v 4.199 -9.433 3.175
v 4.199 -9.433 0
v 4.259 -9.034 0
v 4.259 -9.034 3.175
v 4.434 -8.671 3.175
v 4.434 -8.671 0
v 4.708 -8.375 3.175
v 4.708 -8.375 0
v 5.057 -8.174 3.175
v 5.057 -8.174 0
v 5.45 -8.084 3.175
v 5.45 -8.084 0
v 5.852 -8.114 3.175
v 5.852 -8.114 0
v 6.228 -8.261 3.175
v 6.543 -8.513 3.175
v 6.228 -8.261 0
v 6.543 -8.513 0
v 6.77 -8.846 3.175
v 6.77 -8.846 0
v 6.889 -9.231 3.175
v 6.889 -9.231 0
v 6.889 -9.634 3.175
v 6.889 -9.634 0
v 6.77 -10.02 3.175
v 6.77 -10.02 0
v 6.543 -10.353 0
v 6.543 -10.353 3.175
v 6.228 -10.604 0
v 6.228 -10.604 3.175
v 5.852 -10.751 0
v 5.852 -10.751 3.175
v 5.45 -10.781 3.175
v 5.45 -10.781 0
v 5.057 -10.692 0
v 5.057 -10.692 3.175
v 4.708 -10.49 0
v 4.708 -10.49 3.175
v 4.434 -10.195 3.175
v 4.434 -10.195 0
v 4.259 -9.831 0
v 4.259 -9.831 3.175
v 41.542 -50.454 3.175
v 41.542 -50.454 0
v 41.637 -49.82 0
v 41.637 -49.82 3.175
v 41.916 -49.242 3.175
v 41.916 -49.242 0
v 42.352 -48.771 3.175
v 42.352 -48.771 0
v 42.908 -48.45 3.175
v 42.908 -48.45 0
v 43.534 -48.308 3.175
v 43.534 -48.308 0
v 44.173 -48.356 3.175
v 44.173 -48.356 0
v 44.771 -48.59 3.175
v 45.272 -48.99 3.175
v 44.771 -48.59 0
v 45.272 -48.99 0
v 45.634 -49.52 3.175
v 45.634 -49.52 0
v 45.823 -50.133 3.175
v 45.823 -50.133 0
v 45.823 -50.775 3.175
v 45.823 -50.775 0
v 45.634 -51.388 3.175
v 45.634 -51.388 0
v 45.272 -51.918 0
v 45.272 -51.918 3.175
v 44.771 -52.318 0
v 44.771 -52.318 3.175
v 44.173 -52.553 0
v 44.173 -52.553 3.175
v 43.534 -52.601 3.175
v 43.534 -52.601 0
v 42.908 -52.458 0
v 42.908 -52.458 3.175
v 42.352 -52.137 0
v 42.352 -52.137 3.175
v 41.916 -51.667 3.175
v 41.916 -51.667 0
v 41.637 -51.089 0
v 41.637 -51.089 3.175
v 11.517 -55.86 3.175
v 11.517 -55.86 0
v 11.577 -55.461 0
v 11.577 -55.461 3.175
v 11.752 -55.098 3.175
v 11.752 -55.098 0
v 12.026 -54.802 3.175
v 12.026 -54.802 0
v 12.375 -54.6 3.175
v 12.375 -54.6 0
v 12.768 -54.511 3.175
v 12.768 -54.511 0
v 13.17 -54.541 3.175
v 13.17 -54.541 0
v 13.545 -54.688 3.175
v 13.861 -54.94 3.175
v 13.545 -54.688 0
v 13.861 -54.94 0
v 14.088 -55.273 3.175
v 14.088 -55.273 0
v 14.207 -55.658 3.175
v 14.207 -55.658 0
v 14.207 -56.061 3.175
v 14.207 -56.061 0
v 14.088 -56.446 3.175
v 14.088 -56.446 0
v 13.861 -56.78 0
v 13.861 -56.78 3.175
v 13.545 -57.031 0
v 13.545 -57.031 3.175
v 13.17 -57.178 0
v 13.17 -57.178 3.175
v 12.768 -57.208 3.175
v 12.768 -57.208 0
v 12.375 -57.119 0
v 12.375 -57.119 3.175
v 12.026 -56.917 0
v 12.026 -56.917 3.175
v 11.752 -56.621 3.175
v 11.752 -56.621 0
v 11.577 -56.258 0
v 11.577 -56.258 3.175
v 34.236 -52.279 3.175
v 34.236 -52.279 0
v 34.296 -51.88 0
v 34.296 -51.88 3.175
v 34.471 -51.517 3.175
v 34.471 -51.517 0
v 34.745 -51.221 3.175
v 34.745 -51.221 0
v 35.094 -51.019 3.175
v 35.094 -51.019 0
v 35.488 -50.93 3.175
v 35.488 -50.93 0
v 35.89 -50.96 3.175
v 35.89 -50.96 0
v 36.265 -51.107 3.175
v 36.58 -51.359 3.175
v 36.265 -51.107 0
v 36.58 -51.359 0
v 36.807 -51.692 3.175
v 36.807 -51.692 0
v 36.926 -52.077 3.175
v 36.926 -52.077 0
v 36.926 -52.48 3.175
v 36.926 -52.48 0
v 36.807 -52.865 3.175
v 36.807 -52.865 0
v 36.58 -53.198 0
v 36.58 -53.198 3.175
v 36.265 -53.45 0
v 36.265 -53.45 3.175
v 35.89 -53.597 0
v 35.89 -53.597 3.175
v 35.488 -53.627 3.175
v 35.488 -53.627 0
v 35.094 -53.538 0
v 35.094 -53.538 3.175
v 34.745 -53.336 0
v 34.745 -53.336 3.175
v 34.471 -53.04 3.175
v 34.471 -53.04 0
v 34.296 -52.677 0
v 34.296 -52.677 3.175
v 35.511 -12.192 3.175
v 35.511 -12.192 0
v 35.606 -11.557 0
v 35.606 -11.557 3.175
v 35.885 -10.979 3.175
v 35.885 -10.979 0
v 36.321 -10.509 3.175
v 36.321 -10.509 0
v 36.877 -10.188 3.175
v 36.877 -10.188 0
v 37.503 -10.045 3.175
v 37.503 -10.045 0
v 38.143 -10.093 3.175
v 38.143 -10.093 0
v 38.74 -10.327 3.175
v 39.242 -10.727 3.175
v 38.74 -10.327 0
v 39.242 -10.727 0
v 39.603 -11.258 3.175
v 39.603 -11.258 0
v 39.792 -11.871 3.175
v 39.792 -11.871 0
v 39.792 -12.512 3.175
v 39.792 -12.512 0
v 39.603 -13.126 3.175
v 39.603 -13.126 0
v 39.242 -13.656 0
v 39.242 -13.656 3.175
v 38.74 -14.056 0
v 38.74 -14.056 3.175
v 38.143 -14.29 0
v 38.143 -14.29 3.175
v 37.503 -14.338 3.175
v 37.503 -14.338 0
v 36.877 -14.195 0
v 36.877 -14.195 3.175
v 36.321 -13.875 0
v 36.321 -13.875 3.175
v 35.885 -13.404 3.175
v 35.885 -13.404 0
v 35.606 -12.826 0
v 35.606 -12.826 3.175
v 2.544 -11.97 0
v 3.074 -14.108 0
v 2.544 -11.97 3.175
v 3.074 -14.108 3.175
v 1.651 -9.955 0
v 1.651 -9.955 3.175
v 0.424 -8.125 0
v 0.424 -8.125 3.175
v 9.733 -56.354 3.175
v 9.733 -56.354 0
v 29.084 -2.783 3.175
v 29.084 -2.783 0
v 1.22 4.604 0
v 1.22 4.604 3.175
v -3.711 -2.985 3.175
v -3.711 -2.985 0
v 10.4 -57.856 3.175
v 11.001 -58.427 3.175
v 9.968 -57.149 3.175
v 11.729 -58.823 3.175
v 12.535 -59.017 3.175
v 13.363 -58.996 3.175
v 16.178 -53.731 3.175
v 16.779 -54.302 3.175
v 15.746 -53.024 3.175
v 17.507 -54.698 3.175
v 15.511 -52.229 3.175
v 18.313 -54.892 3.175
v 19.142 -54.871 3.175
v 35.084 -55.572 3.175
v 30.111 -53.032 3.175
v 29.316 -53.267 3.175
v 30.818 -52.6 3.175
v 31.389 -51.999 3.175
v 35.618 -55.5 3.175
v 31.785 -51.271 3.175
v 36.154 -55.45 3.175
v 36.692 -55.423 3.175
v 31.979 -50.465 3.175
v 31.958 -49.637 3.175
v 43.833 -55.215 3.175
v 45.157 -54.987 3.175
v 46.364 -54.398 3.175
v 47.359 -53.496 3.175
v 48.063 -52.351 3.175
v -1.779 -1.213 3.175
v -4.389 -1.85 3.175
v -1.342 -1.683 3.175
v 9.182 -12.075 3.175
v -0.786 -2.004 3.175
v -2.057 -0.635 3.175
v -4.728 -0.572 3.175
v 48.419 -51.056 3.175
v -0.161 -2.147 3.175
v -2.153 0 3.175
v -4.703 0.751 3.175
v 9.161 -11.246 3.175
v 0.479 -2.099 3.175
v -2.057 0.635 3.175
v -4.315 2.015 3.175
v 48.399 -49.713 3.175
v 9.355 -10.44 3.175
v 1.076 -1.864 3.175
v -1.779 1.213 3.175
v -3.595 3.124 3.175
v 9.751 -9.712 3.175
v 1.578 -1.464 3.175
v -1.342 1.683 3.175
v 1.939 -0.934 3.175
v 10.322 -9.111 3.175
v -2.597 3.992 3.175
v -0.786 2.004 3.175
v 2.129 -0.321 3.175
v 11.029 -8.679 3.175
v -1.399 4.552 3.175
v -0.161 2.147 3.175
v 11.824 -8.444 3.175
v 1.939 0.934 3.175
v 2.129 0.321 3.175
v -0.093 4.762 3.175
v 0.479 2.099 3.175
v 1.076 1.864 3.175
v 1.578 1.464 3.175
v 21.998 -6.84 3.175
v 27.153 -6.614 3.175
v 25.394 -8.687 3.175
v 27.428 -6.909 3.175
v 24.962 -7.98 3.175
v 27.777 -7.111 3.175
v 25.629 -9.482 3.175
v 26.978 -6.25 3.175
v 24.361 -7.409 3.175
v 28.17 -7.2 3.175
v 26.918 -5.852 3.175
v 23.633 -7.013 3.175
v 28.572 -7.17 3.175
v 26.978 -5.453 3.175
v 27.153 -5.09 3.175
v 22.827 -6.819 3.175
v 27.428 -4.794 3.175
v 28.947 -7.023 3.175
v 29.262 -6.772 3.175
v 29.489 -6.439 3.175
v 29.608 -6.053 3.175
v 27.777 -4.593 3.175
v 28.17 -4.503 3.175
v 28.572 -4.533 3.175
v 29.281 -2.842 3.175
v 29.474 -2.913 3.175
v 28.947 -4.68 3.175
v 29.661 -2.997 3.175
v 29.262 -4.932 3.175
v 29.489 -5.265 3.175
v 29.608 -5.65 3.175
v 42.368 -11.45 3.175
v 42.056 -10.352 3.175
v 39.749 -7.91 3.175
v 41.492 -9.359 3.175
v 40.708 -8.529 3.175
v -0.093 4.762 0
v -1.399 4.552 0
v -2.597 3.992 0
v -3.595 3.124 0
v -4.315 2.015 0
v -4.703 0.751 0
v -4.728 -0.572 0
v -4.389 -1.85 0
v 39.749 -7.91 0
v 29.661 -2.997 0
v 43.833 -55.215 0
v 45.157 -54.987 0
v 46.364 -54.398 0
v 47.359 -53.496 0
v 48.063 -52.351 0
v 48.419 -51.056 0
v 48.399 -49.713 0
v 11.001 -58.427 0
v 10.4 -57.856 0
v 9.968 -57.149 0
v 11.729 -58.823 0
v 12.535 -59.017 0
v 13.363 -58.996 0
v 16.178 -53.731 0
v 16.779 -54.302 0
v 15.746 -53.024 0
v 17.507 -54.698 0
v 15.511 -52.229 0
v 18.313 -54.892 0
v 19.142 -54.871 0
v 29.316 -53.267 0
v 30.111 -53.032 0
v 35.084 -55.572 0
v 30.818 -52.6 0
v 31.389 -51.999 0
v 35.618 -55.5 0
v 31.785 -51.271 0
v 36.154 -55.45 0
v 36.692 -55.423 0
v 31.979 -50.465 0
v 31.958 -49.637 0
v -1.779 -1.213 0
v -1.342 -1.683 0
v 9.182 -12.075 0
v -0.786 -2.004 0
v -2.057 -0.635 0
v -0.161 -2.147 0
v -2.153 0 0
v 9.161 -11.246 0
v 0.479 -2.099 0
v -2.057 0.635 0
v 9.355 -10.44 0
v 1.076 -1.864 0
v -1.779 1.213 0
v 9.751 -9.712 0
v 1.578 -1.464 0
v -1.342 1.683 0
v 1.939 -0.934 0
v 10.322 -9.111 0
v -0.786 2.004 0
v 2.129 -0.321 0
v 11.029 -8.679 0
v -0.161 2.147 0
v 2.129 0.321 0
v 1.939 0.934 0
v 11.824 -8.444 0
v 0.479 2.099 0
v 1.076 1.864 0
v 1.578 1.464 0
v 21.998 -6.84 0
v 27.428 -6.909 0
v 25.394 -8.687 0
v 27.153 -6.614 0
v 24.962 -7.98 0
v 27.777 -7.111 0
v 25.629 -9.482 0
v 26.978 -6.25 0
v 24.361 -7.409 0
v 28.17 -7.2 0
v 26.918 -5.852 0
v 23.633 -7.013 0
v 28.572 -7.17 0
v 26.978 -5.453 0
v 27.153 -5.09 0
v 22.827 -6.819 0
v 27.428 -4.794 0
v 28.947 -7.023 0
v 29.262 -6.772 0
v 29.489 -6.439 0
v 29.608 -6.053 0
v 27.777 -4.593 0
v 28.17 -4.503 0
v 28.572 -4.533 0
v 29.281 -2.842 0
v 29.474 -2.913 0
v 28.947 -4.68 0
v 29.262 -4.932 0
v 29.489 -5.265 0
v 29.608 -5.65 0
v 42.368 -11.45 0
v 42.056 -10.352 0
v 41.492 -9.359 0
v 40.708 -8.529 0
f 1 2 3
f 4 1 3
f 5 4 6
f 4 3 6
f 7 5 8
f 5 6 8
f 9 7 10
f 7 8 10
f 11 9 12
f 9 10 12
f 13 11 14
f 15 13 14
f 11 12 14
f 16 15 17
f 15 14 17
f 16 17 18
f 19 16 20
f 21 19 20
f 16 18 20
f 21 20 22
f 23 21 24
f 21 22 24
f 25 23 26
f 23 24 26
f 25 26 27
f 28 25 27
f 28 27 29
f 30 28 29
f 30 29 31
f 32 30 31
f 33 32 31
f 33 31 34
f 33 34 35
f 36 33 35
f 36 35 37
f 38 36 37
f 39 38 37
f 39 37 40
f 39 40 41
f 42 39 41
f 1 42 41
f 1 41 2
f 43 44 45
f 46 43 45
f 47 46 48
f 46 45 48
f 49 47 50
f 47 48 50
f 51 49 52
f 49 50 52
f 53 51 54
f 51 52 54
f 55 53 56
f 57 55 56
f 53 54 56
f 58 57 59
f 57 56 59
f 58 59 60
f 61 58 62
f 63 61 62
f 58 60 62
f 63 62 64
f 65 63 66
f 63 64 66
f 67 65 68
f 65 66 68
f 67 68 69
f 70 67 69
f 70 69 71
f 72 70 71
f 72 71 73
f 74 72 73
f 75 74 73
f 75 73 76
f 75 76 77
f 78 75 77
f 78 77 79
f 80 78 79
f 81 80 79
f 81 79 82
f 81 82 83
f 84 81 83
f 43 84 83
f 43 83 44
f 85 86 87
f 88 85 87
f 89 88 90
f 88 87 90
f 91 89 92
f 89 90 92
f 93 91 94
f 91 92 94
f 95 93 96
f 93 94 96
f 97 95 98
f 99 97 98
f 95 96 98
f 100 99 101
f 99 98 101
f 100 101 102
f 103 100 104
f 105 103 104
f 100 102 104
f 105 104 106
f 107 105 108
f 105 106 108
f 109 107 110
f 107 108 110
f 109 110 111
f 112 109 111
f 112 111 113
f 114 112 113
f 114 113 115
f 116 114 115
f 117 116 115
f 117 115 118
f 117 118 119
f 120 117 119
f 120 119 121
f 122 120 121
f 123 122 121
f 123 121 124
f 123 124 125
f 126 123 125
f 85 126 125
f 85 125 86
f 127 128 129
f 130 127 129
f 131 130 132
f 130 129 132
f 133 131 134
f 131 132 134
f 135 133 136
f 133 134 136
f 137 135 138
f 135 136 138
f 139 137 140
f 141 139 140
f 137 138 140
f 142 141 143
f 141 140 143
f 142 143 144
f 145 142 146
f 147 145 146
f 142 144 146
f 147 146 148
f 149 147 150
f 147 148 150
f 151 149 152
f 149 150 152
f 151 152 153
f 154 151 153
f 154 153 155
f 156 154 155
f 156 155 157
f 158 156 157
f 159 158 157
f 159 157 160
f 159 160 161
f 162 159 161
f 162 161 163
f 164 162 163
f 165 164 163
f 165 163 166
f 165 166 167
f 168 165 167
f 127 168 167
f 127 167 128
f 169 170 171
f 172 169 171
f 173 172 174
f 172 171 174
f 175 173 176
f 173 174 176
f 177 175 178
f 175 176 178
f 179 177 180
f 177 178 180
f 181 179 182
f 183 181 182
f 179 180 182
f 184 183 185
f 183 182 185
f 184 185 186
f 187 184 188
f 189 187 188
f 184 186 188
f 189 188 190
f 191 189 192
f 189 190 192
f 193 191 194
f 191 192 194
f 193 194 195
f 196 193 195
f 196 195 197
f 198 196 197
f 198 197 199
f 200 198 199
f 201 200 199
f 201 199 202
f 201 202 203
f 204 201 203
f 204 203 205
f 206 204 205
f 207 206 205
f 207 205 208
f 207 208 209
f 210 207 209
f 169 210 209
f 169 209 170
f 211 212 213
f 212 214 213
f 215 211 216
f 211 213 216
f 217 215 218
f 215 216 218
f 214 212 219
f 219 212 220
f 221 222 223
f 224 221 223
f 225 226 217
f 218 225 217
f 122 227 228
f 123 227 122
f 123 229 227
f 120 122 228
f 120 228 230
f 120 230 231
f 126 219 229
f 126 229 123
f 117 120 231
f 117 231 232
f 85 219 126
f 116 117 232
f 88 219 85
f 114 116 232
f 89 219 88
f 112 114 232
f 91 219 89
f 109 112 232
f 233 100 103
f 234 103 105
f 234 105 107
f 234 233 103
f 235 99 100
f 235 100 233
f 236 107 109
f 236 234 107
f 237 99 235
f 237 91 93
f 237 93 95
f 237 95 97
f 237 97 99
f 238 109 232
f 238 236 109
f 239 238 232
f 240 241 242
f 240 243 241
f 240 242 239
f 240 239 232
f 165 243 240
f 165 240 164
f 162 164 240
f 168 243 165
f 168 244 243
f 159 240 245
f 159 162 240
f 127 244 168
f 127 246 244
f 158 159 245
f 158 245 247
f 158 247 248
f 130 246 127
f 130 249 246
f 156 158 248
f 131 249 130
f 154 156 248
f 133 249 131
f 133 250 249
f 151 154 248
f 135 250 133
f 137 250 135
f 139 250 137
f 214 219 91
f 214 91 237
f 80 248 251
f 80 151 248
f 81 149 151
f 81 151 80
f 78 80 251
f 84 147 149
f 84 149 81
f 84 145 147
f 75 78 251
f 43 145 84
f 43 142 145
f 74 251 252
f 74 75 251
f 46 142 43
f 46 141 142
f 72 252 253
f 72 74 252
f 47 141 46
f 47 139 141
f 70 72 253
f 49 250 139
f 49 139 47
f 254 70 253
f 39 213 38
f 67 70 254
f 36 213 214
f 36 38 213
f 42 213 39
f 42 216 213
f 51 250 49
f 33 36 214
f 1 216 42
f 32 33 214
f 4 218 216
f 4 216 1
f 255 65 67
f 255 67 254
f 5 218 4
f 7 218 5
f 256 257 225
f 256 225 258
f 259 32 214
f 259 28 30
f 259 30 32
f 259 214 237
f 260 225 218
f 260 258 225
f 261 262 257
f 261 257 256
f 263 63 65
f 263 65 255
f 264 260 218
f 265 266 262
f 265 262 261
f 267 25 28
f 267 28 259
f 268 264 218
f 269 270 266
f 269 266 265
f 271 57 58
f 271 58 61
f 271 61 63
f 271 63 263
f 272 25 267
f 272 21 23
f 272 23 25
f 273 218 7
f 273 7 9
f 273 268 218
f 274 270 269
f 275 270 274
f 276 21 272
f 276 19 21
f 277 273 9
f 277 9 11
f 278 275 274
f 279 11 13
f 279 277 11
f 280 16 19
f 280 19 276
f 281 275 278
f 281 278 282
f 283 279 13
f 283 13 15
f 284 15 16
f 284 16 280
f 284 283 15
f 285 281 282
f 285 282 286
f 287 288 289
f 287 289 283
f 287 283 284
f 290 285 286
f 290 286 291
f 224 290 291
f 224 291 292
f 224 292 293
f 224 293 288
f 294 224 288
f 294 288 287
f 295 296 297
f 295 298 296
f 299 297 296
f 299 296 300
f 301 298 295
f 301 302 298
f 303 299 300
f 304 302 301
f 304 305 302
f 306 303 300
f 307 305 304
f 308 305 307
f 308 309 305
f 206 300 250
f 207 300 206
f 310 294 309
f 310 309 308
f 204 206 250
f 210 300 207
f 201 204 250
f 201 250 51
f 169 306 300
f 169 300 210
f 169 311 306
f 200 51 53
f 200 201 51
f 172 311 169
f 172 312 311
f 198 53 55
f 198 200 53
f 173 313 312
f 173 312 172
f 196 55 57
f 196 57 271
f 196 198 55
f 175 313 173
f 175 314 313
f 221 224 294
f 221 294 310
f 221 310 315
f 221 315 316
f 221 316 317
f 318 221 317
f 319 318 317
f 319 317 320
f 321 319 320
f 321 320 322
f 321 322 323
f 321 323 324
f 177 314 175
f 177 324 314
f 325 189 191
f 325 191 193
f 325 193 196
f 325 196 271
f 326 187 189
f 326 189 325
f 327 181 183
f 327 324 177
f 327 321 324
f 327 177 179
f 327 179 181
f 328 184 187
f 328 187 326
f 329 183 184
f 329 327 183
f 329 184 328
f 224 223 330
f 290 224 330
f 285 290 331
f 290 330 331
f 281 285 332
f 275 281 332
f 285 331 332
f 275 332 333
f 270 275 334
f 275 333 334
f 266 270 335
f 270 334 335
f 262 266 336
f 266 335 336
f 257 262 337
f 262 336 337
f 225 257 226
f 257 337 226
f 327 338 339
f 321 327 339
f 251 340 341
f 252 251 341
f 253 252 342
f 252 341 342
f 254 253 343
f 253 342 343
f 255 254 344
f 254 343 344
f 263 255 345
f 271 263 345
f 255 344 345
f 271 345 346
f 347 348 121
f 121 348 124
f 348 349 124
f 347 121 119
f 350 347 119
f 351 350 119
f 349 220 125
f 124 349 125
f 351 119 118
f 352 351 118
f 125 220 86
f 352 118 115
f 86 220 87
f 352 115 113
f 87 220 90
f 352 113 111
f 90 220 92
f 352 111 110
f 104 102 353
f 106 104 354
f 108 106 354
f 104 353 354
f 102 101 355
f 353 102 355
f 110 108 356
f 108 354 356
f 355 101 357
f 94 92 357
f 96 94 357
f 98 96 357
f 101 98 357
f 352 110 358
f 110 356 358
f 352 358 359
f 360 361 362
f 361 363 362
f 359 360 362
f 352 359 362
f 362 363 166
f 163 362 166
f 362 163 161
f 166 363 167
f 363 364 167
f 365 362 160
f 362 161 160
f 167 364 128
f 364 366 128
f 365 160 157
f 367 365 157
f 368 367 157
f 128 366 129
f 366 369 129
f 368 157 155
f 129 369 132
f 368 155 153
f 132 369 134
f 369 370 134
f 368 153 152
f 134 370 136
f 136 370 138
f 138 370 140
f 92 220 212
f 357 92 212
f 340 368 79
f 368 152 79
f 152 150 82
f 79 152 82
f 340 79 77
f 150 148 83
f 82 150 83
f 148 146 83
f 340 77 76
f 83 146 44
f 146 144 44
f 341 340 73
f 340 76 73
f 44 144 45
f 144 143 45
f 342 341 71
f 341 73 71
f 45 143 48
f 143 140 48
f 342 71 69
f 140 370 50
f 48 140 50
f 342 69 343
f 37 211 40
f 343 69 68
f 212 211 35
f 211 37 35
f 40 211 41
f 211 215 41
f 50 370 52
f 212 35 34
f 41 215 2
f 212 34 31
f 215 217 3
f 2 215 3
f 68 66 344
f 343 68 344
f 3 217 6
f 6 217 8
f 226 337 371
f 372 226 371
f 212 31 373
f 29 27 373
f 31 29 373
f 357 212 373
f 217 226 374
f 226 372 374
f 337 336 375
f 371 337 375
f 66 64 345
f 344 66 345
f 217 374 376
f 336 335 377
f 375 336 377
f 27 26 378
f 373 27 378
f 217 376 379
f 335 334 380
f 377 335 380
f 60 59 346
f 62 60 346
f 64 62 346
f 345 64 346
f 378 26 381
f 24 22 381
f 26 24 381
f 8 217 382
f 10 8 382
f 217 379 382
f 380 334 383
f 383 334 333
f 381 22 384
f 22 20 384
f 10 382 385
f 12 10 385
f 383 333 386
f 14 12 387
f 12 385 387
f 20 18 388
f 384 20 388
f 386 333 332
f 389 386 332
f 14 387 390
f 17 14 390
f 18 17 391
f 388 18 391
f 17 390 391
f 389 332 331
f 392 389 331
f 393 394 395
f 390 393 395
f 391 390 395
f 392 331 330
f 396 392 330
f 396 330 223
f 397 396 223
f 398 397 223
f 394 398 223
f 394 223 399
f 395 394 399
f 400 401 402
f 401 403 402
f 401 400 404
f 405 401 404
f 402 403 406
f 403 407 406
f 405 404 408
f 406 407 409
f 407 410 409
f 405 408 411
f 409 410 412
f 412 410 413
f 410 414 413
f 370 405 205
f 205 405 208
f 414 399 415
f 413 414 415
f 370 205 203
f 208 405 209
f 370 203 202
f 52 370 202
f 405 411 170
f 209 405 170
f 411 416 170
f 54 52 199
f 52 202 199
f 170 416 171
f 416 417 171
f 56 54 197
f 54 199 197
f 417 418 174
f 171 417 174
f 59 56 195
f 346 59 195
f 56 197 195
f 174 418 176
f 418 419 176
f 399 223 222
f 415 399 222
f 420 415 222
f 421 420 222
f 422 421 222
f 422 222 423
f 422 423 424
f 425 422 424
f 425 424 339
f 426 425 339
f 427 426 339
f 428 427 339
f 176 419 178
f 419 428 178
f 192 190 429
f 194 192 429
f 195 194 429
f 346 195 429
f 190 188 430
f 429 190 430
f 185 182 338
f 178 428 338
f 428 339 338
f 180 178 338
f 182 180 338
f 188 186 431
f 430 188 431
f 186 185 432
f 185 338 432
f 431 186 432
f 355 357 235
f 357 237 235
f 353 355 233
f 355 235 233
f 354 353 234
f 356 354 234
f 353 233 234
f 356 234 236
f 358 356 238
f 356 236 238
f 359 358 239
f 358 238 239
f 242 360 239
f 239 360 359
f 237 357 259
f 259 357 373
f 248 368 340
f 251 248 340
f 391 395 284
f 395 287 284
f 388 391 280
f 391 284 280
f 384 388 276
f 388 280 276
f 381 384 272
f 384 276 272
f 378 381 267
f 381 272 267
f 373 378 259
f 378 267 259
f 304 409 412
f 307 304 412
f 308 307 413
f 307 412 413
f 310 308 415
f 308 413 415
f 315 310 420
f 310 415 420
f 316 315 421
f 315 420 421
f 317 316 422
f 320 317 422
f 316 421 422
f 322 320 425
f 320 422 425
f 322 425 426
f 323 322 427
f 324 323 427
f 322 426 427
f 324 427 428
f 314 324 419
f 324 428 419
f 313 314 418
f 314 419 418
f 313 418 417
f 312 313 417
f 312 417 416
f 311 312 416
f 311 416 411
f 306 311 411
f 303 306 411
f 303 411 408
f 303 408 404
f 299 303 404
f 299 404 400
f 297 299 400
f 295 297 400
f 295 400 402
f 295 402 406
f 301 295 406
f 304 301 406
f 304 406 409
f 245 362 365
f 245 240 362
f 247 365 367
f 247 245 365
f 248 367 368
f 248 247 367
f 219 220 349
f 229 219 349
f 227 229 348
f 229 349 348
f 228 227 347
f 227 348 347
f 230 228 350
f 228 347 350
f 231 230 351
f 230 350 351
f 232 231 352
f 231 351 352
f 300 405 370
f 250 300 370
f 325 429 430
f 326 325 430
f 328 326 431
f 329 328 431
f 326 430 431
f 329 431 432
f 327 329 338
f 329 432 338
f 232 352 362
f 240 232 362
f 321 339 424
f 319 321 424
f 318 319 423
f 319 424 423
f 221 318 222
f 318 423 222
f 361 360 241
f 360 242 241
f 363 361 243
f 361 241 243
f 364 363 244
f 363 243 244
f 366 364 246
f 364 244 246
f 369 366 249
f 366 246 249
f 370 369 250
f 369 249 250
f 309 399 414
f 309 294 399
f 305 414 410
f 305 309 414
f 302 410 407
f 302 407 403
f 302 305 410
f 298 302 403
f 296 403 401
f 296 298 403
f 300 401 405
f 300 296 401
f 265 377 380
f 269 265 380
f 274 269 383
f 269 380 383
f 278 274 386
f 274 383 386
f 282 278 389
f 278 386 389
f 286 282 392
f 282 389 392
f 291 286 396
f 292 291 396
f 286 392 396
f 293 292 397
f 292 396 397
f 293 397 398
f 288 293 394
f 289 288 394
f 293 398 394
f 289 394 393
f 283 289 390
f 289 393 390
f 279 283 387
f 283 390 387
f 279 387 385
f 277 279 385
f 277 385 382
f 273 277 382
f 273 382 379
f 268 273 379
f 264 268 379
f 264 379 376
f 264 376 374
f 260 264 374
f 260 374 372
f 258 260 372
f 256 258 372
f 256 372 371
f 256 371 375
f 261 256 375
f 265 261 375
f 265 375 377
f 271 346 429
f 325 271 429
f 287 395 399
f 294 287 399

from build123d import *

# Parameters (mm, degrees)
BOSS_EXTRUDE1_DEPTH   = 3.175
FILLET1_R             = 3.175
FILLET2_R             = 12.7
F_2_CLEARANCE_HOLE1_D = 2.7051
F_6_CLEARANCE_HOLE1_D = 4.3053


with BuildPart() as part:
    # Sketch1 → Boss-Extrude1 (new body)
    with BuildSketch(Plane.XY):
        with BuildLine():
            Line((13.363407355, -58.995822037), (35.883167135, -55.446288697))
            Line((35.883167135, -55.446288697), (43.833071408, -55.214709803))
            ThreePointArc((43.833071408, -55.214709803), (47.359348086, -53.495537965), (48.398820761, -49.712724781))
            Line((48.398820761, -49.712724781), (42.367918864, -11.450100102))
            ThreePointArc((42.367918864, -11.450100102), (41.492080159, -9.359050224), (39.748688678, -7.90985418))
            Line((39.748688678, -7.90985418), (29.660979166, -2.997190284))
            ThreePointArc((29.660979166, -2.997190284), (29.377888176, -2.875939169), (29.084381769, -2.78268505))
            Line((29.084381769, -2.78268505), (1.220294786, 4.603508106))
            ThreePointArc((1.220294786, 4.603508106), (-3.993511378, 2.594855125), (-3.710688281, -2.98533059))
            Line((-3.710688281, -2.98533059), (2.546868459, -10.763310872))
            Line((2.546868459, -10.763310872), (9.732790422, -56.353877547))
            ThreePointArc((9.732790422, -56.353877547), (11.000934269, -58.426775179), (13.363407355, -58.995822037))
        make_face()
        Polygon((25.134571201, -6.346026675), (32.452304237, -52.772859253), (16.005351845, -55.365205105), (8.687618809, -8.938372527), align=None, mode=Mode.SUBTRACT)
    extrude(amount=BOSS_EXTRUDE1_DEPTH)

    # Fillet1
    fillet1_edges = [part.edges().sort_by_distance(p)[0] for p in [
        (32.452304237, -52.772859253, 1.5875),
        (25.134571201, -6.346026675, 1.5875),
        (8.687618809, -8.938372527, 1.5875),
        (16.005351845, -55.365205105, 1.5875),
    ]]
    fillet(fillet1_edges, radius=FILLET1_R)

    # Fillet2
    fillet2_edges = [part.edges().sort_by_distance(p)[0] for p in [
        (2.546868459, -10.763310872, 1.5875),
        (35.883167135, -55.446288697, 1.5875),
    ]]
    fillet(fillet2_edges, radius=FILLET2_R)

    # #2 Clearance Hole1 (through all)
    with Locations(Plane.XY.offset(3.175)):
        with Locations((5.551338097, -9.432708748), (28.270851912, -5.851690454), (35.588584948, -52.278523032), (12.869071133, -55.859541326)):
            Hole(F_2_CLEARANCE_HOLE1_D / 2)

    # #6 Clearance Hole1 (through all)
    with Locations(Plane.XY.offset(3.175)):
        with Locations((0, 0), (37.663497797, -12.191604434), (43.694399694, -50.454229113)):
            Hole(F_6_CLEARANCE_HOLE1_D / 2)


solid = part.part
